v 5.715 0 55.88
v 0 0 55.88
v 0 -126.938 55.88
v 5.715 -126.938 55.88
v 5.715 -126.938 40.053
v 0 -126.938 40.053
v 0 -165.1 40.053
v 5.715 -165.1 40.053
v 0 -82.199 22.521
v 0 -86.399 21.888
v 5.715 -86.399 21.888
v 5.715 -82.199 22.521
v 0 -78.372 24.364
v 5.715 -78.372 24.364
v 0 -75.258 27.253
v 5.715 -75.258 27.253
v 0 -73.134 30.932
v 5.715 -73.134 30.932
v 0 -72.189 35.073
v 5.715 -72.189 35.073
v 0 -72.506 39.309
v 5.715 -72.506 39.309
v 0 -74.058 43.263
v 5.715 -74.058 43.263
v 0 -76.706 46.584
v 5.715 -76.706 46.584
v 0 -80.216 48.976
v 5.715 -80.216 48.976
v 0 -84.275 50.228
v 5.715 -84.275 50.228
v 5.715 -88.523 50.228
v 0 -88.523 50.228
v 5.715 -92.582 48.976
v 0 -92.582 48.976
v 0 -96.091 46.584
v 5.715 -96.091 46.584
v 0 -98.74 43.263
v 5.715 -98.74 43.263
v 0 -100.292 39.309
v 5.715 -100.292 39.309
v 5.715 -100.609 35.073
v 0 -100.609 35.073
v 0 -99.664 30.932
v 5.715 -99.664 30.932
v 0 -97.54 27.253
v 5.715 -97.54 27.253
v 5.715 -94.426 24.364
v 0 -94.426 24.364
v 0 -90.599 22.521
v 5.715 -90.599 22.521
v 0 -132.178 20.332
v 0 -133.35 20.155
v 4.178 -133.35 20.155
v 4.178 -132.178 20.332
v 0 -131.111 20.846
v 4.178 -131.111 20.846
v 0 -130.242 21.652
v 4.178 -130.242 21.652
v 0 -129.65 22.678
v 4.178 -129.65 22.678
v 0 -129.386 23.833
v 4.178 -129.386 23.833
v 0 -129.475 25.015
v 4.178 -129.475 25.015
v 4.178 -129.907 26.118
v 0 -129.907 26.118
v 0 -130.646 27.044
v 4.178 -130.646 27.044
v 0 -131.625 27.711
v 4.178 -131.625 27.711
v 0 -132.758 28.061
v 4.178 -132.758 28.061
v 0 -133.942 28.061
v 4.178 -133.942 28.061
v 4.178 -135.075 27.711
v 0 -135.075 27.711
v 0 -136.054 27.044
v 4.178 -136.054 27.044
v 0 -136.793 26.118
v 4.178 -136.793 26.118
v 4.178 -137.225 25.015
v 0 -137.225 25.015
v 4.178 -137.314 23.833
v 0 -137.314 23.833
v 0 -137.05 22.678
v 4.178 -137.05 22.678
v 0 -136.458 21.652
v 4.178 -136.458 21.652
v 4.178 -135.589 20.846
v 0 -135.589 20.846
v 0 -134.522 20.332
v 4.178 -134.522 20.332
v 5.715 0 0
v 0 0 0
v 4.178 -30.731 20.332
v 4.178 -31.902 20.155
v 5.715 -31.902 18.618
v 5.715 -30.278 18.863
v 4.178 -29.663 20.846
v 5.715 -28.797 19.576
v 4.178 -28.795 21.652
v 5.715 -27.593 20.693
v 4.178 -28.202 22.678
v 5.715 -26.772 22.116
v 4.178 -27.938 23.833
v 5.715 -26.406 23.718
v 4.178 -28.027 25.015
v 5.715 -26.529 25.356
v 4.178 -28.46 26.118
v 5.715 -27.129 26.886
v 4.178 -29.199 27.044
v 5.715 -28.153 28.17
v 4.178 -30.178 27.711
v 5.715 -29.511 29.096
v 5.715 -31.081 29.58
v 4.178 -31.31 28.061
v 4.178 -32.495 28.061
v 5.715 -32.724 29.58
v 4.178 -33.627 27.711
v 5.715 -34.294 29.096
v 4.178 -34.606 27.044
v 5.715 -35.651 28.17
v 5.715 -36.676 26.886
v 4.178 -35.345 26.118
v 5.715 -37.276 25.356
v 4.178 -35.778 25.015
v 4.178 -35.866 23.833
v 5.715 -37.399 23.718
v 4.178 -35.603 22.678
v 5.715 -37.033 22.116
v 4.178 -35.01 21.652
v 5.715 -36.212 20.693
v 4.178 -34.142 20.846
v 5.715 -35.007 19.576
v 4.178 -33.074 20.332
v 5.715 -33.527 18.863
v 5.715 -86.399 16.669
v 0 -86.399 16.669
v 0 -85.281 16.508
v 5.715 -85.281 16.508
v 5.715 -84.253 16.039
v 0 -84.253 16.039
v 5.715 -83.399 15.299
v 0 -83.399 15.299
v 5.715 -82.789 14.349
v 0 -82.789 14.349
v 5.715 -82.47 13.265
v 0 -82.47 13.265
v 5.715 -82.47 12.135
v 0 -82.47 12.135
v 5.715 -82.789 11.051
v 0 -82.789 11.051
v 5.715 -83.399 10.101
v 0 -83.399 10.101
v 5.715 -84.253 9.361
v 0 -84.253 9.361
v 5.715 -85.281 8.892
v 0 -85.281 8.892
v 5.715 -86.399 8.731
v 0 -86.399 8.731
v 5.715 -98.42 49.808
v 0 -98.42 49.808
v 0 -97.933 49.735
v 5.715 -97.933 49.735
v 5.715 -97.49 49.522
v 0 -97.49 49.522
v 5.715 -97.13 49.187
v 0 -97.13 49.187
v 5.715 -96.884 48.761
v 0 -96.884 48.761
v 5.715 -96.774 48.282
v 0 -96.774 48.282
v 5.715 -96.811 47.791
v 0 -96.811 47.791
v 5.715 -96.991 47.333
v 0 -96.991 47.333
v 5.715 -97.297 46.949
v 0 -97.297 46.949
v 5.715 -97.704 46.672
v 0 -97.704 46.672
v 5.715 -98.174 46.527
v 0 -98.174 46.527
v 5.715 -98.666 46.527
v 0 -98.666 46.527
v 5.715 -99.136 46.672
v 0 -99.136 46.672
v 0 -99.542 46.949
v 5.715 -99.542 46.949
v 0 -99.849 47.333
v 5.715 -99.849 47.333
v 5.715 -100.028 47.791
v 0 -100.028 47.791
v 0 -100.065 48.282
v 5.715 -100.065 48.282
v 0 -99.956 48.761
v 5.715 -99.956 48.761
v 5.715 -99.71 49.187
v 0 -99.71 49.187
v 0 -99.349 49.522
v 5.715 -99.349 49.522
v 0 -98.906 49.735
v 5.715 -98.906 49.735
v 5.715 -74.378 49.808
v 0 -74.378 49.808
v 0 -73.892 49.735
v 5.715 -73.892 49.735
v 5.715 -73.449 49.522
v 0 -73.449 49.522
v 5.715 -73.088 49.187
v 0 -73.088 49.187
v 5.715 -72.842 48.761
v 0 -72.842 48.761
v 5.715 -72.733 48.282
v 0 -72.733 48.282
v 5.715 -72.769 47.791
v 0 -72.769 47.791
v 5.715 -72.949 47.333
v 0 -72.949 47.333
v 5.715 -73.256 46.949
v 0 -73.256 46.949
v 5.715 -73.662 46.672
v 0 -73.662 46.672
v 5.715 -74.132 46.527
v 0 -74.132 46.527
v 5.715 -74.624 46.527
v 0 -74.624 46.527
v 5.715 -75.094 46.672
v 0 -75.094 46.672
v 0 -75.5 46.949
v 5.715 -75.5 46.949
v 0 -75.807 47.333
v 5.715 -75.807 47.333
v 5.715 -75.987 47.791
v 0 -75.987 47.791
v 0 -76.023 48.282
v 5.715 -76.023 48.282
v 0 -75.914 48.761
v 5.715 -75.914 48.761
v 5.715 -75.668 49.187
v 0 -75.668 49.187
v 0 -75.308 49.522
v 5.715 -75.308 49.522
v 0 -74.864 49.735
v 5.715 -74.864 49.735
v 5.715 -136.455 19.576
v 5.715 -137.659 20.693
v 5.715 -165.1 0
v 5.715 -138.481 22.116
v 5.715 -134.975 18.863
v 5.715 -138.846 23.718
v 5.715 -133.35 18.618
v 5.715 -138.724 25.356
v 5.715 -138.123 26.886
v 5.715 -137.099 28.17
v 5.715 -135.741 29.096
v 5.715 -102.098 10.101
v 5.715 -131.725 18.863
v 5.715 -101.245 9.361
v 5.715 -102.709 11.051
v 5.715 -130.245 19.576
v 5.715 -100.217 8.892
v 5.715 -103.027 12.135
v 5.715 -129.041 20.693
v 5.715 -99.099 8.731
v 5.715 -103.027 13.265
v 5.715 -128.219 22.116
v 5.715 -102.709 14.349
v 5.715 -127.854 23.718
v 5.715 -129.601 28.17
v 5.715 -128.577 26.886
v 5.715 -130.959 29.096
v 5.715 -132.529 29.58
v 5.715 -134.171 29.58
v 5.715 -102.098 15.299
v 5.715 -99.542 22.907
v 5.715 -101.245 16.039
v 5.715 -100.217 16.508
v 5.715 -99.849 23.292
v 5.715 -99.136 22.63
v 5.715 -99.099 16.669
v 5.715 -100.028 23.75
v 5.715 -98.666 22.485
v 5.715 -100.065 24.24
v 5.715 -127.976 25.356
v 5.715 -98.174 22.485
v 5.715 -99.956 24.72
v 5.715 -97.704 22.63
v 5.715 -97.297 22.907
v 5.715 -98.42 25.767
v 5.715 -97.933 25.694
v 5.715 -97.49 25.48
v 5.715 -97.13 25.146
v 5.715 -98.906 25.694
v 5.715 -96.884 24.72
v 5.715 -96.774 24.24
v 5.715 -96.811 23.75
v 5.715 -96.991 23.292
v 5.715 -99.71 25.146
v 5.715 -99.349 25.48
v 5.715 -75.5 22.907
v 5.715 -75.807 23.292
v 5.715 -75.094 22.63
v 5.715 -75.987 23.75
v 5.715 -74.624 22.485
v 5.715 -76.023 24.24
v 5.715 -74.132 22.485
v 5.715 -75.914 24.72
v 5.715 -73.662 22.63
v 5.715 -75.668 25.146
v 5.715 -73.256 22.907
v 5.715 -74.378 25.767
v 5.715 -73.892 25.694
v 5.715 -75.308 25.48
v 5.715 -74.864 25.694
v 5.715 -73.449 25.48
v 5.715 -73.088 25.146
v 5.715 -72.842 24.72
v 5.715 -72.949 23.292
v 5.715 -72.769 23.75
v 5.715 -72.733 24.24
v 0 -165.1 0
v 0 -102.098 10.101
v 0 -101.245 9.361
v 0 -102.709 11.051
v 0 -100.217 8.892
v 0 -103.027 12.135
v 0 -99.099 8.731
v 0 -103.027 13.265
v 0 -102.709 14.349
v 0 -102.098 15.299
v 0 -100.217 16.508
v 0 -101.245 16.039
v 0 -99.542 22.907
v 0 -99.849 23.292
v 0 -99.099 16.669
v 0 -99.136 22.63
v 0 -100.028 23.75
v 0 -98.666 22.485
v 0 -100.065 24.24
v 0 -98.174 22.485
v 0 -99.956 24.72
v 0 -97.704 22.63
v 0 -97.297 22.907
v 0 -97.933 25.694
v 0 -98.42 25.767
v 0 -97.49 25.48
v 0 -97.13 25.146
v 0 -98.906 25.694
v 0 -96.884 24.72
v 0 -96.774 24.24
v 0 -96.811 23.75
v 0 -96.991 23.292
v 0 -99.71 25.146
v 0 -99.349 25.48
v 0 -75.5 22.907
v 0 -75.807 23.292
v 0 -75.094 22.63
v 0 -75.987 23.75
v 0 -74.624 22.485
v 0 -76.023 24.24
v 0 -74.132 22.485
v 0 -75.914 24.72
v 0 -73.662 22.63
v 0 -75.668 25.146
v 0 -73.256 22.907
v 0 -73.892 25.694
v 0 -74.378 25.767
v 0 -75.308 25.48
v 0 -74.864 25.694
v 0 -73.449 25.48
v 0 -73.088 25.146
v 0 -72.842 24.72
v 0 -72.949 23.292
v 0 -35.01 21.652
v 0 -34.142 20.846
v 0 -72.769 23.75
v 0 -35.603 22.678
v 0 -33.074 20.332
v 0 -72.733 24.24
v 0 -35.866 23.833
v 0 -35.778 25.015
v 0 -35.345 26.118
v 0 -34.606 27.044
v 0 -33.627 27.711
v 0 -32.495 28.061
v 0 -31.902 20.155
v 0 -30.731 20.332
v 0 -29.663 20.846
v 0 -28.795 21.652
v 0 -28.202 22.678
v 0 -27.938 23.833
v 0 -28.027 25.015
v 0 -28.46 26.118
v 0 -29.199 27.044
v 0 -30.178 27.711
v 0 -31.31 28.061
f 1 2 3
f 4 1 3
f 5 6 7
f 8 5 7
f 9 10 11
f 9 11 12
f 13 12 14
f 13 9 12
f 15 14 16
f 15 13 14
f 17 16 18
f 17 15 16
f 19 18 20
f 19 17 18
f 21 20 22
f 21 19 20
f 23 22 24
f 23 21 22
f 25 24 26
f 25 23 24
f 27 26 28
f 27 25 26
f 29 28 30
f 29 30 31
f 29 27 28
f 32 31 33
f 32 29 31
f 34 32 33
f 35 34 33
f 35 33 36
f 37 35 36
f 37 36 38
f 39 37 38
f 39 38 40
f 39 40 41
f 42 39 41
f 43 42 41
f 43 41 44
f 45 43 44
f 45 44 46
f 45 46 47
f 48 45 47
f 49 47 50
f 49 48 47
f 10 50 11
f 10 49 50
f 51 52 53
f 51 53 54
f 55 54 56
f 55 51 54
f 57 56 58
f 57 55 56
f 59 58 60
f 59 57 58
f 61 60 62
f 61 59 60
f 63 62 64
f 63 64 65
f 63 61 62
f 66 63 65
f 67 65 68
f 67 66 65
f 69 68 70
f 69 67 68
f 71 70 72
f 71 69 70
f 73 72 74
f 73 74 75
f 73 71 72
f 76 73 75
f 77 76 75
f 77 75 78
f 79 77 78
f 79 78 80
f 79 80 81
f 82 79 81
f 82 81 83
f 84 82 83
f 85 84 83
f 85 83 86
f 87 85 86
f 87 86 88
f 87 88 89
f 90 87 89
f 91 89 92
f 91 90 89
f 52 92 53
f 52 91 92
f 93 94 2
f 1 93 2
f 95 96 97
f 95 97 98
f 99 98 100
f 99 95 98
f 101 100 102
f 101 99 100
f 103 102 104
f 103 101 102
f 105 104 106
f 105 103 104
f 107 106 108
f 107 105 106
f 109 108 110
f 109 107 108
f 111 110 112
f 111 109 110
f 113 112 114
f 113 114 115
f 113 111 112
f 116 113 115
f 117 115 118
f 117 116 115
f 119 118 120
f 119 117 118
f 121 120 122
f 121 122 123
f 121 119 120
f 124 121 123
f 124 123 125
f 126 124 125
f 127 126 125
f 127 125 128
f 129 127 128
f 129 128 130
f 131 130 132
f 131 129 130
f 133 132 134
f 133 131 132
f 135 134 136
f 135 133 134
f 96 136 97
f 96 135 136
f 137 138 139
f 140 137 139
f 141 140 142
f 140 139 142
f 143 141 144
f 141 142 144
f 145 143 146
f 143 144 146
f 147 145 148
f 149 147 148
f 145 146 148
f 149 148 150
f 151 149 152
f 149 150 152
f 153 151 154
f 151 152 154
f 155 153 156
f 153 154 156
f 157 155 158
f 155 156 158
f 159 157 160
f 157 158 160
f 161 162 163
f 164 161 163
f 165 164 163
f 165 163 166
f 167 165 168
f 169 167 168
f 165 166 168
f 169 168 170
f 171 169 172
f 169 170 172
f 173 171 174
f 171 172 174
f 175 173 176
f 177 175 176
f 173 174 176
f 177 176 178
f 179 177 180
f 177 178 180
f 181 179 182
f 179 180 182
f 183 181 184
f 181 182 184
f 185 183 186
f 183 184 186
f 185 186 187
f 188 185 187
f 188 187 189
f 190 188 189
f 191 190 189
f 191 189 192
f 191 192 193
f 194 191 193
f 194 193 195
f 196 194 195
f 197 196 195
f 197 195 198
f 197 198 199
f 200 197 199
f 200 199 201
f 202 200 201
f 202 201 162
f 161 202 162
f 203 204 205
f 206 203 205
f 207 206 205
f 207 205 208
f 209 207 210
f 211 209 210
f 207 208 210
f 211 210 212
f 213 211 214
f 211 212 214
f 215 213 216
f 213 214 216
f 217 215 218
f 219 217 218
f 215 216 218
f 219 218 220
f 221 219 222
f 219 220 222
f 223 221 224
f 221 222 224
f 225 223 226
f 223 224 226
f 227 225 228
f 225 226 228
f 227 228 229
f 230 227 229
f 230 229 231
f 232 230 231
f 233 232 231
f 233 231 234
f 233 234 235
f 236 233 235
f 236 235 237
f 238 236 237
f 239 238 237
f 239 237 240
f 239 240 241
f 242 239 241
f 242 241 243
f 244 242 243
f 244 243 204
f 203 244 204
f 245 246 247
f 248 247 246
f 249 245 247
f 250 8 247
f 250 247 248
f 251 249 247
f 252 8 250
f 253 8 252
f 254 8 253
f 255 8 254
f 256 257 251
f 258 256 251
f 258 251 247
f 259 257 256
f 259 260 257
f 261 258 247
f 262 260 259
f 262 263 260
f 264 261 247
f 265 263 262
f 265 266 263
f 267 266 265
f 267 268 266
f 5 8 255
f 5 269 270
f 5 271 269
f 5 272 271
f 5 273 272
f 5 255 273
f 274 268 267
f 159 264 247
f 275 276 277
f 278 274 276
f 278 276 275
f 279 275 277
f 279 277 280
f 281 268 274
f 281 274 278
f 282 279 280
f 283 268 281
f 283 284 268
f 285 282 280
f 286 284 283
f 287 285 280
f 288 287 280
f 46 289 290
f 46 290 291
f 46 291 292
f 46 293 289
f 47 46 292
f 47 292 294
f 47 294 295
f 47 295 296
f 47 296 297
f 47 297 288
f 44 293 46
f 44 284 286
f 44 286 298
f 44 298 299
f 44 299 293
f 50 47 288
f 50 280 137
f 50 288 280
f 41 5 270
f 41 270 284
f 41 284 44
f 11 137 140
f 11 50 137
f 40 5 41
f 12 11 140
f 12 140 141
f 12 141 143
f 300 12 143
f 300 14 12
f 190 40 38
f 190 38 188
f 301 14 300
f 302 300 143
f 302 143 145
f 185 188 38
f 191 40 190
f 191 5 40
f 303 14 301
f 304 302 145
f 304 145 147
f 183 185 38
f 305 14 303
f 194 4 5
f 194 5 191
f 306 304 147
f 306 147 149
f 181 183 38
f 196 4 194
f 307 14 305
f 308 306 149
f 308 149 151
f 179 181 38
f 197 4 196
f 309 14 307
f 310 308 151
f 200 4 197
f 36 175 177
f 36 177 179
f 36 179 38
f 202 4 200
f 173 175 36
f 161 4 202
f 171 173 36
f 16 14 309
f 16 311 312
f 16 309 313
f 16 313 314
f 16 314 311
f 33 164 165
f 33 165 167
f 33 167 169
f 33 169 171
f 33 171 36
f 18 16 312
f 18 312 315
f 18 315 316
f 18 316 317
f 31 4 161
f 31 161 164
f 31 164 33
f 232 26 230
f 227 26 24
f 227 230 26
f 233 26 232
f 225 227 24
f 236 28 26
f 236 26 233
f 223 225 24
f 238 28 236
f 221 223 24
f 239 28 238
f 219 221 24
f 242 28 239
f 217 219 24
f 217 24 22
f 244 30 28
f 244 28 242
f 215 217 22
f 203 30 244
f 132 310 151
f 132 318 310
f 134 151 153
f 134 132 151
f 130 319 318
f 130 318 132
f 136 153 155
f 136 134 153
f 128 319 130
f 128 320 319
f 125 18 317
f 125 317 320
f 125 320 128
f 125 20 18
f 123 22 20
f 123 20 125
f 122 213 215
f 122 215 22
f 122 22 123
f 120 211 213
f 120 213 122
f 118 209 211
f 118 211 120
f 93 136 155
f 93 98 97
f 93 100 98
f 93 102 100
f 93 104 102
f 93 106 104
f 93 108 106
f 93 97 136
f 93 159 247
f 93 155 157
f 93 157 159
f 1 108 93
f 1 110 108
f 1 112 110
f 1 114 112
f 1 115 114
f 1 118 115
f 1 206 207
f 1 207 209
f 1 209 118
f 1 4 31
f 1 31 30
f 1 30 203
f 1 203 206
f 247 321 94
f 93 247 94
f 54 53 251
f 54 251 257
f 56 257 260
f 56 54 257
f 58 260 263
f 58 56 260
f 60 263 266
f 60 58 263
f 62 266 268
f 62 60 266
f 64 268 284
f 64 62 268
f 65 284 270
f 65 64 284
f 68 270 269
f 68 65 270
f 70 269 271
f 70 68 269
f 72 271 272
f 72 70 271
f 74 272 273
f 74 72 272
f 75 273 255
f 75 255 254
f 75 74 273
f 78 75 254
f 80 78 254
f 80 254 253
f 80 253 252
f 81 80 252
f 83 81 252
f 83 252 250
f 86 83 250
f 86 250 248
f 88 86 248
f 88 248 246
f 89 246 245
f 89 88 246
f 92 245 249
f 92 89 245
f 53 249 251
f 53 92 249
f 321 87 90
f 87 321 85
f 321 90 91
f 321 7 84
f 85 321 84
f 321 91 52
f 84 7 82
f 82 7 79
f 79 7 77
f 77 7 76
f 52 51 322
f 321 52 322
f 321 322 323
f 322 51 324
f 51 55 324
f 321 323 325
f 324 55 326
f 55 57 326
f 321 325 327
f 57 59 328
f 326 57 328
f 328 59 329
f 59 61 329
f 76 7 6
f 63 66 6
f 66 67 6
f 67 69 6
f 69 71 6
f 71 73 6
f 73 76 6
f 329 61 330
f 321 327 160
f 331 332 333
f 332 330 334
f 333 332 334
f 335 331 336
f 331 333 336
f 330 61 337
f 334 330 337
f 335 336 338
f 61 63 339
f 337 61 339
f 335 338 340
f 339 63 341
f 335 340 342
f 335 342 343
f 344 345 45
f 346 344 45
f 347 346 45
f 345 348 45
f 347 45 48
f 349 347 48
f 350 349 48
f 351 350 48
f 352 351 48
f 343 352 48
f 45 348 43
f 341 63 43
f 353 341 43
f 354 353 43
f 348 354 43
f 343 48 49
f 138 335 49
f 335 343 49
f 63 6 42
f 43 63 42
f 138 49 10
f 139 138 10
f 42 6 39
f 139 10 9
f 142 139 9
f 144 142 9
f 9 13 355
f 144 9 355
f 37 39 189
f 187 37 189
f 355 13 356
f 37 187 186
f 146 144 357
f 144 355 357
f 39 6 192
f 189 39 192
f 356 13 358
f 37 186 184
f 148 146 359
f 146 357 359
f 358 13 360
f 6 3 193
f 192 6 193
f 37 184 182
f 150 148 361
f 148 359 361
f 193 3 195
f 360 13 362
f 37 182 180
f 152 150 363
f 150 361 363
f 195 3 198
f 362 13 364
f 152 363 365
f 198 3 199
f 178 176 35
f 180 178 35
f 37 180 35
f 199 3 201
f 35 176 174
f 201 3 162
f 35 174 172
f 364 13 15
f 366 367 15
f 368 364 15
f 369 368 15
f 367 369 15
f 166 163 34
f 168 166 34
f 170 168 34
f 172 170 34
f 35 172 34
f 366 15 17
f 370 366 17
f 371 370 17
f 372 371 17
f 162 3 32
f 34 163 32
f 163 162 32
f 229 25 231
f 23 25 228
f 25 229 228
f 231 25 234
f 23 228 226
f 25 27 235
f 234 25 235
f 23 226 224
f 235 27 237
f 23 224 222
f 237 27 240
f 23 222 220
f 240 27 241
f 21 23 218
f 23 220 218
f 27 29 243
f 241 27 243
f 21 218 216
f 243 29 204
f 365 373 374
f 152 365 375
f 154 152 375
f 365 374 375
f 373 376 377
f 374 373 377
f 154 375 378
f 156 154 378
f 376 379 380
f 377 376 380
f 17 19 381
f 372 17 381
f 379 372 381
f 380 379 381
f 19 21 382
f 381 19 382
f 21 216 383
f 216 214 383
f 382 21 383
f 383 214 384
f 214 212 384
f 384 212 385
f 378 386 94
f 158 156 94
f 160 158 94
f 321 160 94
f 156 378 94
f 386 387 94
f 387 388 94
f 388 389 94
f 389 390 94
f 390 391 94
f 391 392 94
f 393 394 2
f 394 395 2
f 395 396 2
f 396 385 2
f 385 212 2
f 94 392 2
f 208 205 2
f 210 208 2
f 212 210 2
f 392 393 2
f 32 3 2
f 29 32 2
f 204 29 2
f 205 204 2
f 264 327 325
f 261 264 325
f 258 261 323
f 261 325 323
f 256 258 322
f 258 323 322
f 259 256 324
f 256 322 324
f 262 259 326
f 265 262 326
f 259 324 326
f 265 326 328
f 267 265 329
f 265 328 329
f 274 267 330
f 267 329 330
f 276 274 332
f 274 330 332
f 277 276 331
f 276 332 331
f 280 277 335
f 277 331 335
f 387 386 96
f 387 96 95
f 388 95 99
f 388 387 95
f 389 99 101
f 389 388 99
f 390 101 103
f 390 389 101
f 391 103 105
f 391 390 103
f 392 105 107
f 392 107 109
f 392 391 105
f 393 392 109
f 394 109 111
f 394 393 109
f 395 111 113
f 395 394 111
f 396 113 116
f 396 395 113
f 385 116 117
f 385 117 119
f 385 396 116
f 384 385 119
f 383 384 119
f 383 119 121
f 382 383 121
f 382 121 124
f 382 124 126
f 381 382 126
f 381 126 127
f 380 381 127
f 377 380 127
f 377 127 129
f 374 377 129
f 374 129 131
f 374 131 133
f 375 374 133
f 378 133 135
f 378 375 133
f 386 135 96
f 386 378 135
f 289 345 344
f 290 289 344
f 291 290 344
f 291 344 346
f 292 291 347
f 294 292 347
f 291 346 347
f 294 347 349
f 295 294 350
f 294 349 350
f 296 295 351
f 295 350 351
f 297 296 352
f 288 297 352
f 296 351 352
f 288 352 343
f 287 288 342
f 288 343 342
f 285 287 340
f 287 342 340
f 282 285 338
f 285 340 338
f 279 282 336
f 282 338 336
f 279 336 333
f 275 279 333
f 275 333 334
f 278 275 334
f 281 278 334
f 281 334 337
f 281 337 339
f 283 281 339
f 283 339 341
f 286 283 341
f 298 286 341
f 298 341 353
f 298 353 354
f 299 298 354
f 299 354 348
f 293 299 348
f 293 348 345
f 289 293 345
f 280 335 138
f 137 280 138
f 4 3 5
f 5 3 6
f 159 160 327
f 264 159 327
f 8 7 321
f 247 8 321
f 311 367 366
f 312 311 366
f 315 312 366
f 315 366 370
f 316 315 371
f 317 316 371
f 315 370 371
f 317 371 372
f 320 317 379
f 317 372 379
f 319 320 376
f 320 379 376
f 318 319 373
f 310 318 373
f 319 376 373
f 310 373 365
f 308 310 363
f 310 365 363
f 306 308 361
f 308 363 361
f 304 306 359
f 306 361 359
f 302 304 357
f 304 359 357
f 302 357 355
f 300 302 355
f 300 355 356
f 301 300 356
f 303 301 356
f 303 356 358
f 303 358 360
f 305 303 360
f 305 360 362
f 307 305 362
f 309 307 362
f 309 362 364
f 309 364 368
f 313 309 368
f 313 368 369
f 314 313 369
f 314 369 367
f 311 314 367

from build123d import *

# Parameters (mm, degrees)
SKETCH1_R             = 3.9751
SKETCH1_R_2           = 14.249999948
BOSS_EXTRUDE1_DEPTH   = 5.715
M4X0_7_TAPPED_HOLE1_D = 3.3
CHAMFER1_SIZE         = 1.5367


with BuildPart() as part:
    # Sketch1 → Boss-Extrude1 (new body)
    with BuildSketch(Plane.YZ):
        Polygon((-165.1, 0), (0, 0), (0, 55.88), (-126.937814396, 55.88), (-126.937814396, 40.052578354), (-165.1, 40.052578354), align=None)
        with BuildLine():
            ThreePointArc((-99.098846149, 8.73125), (-103.067596149, 12.7), (-99.098846149, 16.66875))
            Line((-99.098846149, 16.66875), (-86.398846149, 16.66875))
            ThreePointArc((-86.398846149, 16.66875), (-82.430096149, 12.7), (-86.398846149, 8.73125))
            Line((-86.398846149, 8.73125), (-99.098846149, 8.73125))
        make_face(mode=Mode.SUBTRACT)
        with Locations(Location((-133.35, 24.13, 0), (0, 0, 270))):
            Circle(SKETCH1_R, mode=Mode.SUBTRACT)
        with Locations(Location((-31.9024, 24.13, 0), (0, 0, 270))):
            Circle(SKETCH1_R, mode=Mode.SUBTRACT)
        with Locations(Location((-86.398846149, 36.137660549, 0), (0, 0, 270))):
            Circle(SKETCH1_R_2, mode=Mode.SUBTRACT)
    extrude(amount=BOSS_EXTRUDE1_DEPTH)

    # M4x0.7 Tapped Hole1 (through all)
    with Locations(Plane(origin=(5.715, 0, 0), x_dir=(0, 0, -1), z_dir=(1, 0, 0))):
        with Locations((-48.158475855, -74.378030844), (-24.116845244, -74.378030844), (-24.116845244, -98.419661455), (-48.158475855, -98.419661455)):
            Hole(M4X0_7_TAPPED_HOLE1_D / 2)

    # Chamfer1
    chamfer1_edges = [part.edges().sort_by_distance(p)[0] for p in [
        (5.715, -31.9024, 28.1051),
        (5.715, -133.35, 28.1051),
    ]]
    chamfer(chamfer1_edges, length=CHAMFER1_SIZE)


solid = part.part
